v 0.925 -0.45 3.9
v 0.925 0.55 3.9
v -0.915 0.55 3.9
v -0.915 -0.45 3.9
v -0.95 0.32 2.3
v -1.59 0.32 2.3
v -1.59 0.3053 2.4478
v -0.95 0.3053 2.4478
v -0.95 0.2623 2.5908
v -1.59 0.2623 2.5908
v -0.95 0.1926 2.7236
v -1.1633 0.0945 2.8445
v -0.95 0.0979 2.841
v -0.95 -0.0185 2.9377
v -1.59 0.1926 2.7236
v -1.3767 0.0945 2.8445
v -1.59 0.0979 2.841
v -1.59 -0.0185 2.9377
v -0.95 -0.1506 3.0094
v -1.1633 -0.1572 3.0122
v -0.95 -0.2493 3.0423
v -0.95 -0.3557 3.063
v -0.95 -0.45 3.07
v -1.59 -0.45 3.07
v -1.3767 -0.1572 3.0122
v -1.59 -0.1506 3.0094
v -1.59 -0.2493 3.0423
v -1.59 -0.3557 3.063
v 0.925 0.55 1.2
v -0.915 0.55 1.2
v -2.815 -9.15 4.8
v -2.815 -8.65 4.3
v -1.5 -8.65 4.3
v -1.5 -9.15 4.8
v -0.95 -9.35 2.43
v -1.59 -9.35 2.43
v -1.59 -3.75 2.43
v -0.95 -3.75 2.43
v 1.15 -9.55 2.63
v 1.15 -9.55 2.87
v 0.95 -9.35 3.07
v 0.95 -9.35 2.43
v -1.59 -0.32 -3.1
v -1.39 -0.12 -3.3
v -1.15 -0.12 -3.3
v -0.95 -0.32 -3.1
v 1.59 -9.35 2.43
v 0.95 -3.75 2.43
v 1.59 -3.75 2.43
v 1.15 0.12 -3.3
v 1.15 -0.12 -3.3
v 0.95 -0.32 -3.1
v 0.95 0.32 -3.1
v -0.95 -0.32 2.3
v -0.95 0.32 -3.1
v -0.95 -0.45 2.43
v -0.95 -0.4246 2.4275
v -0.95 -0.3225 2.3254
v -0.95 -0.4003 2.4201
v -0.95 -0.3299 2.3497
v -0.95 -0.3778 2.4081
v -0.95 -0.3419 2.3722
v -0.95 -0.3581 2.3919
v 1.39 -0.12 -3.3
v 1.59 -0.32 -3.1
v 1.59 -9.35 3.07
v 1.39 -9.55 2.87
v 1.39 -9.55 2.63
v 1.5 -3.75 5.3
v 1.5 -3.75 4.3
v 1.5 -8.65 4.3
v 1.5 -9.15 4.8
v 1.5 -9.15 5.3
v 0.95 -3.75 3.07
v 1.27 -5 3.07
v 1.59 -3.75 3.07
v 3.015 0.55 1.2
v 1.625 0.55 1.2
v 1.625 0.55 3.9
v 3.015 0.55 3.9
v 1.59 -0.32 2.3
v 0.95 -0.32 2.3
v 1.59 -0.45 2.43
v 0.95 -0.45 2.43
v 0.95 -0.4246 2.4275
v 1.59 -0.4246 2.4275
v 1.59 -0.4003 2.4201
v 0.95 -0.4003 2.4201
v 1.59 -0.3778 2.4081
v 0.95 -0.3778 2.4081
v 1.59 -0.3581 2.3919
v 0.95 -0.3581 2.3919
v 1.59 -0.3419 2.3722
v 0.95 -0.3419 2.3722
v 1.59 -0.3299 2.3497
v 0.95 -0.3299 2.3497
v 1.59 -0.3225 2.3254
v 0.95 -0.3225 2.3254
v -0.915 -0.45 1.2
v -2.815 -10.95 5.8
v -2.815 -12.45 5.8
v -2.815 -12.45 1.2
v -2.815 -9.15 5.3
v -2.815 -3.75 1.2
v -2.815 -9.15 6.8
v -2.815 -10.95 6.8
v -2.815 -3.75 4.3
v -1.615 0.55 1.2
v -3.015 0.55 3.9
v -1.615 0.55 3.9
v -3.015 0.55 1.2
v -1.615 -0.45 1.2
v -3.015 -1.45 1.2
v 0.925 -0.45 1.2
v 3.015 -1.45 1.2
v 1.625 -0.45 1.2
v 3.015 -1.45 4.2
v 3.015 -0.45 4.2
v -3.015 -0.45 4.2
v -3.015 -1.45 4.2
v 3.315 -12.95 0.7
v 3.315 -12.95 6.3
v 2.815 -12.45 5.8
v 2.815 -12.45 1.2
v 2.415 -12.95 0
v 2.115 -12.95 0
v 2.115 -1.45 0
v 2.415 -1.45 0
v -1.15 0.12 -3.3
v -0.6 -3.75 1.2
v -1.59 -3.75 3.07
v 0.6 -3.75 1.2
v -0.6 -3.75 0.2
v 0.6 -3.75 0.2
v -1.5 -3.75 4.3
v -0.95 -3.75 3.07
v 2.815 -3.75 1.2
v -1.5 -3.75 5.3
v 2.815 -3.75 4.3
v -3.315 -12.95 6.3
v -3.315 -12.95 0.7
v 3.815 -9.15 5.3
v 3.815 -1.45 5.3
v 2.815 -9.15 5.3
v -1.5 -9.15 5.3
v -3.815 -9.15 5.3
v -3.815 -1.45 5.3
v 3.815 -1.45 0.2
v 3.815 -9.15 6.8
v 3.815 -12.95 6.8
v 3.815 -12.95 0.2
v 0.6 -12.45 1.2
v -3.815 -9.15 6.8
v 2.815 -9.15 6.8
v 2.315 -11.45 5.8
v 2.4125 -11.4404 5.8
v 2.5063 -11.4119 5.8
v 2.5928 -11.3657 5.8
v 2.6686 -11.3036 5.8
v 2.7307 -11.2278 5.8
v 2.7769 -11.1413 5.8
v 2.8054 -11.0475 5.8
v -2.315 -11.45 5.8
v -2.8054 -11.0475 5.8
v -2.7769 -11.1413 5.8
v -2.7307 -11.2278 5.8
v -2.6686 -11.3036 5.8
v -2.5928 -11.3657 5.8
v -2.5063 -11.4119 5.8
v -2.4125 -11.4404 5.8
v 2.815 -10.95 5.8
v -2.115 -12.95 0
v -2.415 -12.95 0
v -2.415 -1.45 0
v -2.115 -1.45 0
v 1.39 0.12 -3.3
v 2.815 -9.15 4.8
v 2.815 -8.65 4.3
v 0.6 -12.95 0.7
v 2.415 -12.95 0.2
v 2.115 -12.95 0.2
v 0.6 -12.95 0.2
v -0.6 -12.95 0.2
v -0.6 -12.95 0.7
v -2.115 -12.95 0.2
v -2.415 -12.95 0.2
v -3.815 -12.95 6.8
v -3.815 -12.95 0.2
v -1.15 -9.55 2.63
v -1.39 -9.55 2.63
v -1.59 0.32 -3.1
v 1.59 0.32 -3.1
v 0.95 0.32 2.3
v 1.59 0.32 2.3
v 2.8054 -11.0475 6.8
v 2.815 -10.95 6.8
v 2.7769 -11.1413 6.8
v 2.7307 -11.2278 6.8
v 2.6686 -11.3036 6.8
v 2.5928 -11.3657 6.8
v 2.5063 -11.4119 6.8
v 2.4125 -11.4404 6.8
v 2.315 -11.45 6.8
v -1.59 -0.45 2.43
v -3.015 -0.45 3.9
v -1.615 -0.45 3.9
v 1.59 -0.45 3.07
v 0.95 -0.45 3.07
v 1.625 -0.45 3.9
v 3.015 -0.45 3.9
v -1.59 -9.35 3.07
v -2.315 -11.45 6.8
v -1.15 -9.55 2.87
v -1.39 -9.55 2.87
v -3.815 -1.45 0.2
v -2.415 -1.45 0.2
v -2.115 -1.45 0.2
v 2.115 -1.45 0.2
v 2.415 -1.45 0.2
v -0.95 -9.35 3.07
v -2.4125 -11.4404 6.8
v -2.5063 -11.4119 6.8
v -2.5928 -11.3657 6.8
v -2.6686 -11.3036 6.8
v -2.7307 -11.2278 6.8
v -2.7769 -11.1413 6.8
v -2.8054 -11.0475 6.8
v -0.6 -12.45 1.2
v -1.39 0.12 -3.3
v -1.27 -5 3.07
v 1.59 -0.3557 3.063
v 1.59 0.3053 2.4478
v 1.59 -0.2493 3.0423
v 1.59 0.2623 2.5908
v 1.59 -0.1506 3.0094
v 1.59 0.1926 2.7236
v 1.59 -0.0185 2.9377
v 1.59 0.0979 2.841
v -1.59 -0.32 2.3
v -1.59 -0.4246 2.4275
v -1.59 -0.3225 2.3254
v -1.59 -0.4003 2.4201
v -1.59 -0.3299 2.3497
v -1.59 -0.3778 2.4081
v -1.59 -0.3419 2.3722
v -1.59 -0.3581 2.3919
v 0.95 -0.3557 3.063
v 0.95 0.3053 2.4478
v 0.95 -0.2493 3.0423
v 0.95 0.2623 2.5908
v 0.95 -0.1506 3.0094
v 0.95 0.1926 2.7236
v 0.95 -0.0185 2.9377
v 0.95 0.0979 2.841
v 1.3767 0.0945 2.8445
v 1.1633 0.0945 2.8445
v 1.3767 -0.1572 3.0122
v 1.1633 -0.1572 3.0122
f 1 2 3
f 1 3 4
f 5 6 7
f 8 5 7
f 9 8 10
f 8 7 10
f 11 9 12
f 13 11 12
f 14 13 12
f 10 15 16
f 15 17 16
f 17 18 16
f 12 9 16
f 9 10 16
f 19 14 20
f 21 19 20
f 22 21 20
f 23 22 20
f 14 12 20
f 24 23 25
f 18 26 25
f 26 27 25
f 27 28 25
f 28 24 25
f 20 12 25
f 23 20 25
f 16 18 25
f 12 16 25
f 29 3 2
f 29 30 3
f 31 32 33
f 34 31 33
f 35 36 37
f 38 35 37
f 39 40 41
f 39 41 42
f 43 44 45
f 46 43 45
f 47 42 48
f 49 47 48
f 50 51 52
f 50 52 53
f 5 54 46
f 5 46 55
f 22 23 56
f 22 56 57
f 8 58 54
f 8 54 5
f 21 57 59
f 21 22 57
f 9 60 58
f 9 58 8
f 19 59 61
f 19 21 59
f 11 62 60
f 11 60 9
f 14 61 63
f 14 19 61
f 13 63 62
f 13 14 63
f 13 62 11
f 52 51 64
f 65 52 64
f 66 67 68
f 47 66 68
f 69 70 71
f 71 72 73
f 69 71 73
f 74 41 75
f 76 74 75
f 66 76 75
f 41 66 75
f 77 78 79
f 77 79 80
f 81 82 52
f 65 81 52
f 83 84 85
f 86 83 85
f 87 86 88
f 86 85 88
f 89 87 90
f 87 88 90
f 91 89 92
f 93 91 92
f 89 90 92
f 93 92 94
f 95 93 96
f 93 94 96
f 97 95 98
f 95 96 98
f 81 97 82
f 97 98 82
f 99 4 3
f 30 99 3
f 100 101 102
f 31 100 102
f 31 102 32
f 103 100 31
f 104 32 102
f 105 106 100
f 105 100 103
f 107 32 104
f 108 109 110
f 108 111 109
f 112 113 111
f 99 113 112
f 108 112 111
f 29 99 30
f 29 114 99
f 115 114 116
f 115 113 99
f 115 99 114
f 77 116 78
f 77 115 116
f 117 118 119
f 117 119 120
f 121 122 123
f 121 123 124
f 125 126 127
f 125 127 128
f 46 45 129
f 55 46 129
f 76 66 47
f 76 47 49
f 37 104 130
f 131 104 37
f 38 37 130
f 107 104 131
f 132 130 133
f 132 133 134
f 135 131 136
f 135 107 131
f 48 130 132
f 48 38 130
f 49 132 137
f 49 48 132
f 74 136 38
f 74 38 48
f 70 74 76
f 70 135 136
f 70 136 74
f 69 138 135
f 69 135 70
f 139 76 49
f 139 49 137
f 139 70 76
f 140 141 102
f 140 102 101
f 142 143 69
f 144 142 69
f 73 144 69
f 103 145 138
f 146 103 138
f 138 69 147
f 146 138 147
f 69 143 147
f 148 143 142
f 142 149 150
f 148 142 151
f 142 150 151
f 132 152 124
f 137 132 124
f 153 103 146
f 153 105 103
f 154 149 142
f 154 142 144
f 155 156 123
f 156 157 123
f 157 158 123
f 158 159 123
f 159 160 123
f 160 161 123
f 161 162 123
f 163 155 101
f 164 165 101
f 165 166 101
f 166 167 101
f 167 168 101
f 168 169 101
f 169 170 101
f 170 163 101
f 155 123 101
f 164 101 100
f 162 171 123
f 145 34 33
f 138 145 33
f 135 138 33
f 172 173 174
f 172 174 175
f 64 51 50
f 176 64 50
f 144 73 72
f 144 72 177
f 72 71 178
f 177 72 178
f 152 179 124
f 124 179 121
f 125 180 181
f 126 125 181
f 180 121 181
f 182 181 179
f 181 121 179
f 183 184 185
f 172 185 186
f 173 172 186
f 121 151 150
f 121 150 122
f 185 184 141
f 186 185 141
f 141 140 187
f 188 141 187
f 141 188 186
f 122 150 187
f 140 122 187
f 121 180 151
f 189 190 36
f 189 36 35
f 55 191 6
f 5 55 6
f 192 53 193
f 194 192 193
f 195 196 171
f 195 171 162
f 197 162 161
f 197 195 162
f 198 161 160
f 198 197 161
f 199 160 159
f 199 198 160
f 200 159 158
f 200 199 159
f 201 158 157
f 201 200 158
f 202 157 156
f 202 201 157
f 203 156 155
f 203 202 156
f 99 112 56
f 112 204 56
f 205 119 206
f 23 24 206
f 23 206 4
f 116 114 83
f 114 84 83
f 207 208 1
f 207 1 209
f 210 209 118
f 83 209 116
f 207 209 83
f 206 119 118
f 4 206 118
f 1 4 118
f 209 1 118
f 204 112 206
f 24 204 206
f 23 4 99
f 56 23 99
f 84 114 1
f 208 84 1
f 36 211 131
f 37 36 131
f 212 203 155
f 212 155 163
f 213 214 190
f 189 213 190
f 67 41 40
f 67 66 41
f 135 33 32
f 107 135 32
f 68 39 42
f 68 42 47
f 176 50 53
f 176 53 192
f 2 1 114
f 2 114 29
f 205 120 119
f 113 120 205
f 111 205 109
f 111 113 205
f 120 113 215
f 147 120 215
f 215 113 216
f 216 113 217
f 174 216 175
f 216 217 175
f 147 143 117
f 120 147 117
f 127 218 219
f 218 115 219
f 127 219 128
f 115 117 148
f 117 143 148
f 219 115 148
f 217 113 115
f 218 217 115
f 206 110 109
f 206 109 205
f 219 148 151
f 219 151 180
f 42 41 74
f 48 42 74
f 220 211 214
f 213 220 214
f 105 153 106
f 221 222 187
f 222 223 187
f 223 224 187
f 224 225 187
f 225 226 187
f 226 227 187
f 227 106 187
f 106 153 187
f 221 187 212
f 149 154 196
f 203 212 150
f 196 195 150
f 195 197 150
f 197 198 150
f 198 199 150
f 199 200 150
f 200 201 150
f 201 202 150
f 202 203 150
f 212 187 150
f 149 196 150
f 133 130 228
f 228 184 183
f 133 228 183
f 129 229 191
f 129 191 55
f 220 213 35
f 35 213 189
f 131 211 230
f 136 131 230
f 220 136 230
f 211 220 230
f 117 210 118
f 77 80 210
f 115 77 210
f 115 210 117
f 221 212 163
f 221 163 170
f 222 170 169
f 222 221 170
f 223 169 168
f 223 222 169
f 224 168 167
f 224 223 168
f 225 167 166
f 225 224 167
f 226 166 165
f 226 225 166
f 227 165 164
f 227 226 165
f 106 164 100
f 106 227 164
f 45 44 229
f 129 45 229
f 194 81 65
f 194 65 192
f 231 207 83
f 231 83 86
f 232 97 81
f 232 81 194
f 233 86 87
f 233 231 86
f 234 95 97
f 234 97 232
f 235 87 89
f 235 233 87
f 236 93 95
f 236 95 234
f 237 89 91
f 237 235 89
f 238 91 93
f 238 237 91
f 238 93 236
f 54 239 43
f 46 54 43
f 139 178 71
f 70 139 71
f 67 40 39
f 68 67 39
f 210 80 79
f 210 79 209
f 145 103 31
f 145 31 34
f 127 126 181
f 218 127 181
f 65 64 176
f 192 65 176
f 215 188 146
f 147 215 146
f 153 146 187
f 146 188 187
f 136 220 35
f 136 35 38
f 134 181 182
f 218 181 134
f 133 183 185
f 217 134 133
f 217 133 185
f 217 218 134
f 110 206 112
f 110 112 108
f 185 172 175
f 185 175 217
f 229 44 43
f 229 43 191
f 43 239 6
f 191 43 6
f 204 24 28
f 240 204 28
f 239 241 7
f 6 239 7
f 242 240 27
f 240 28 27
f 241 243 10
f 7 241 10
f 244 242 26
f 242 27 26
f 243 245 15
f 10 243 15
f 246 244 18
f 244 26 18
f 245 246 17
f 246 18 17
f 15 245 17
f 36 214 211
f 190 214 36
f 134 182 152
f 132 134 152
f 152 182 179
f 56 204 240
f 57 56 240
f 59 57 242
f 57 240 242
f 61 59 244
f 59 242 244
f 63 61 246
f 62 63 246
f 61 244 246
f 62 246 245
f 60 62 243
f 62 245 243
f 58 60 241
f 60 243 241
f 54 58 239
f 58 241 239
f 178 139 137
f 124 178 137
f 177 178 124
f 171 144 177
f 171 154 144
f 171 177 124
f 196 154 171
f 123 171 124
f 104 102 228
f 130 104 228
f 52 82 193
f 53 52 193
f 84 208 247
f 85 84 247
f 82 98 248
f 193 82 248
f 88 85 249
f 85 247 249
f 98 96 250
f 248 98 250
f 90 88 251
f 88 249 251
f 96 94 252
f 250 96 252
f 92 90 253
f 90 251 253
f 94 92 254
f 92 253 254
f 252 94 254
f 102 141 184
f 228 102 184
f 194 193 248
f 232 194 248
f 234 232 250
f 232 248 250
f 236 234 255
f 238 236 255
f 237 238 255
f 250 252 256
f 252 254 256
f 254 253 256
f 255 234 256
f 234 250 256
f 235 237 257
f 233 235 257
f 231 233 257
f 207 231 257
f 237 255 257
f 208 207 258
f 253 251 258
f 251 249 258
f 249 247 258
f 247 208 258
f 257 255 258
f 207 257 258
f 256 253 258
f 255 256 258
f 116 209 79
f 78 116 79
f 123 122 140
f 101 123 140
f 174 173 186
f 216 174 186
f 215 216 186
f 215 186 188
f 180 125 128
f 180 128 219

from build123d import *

# Parameters (mm, degrees)
EXTRUDE_START                      = 0.2
EXTRUDE_1_DEPTH                    = 5.1
SKETCH_7_W                         = 0.3
SKETCH_7_H                         = 0.2
EXTRUDE_4_DEPTH                    = 11.5
SKETCH_8_W                         = 1
SKETCH_8_H                         = 2
CUT_EXTRUDE_5_DEPTH                = 6.03
CUT_EXTRUDE_1_DEPTH                = 9.2
EXTRUDE_2_DEPTH                    = 3.8
SKETCH_4_W                         = 5.63
SKETCH_4_H                         = 1
CUT_EXTRUDE_2_DEPTH                = 3.8
CUT_EXTRUDE_3_REACH                = 17.116
CHAMFER_1_SIZE                     = 0.5
CUT_EXTRUDE_6_REACH                = 16.052
SKETCH_9_W                         = 0.7
SKETCH_9_H                         = 1
SWEEP_START                        = 0.95
SWEEP_1_DEPTH                      = 0.64
CHAMFER_2_SIZE                     = 0.2
PATTERN_LINEAR_2_COUNT             = 2
PATTERN_LINEAR_2_PITCH             = 2.54
PATTERN_LINEAR_1_COUNT             = 2
PATTERN_LINEAR_1_PITCH             = 2.54
CHAMFER_2_OF_PATTERN_LINEAR_1_SIZE = 0.2


# Read off the part's stored shape, not the designer's step: По траектории1
with BuildPart() as part:
    # Эскиз1 → Бобышка-Вытянуть1 (new body)
    with BuildSketch(Plane.XY.offset(EXTRUDE_START)):
        Polygon((-3.015, 0.55), (3.015, 0.55), (3.015, -1.45), (3.815, -1.45), (3.815, -12.95), (-3.815, -12.95), (-3.815, -1.45), (-3.015, -1.45), align=None)
    extrude(amount=EXTRUDE_1_DEPTH)

    # Эскиз7 → Бобышка-Вытянуть4 (add)
    with BuildSketch(Plane.XZ.offset(12.95)):
        with Locations((2.265, 0.1)):
            Rectangle(SKETCH_7_W, SKETCH_7_H)
        with Locations((-2.265, 0.1)):
            Rectangle(SKETCH_7_W, SKETCH_7_H)
    extrude(amount=-EXTRUDE_4_DEPTH)

    # Эскиз8 → Вырез-Вытянуть5 (cut)
    with BuildSketch(Plane(origin=(3.015, 0, 0), x_dir=(0, 0, -1), z_dir=(1, 0, 0))):
        with Locations((-0.7, -0.45)):
            Rectangle(SKETCH_8_W, SKETCH_8_H)
        Polygon((-4.2, -1.45), (-5.3, -1.45), (-5.3, 0.55), (-3.9, 0.55), (-3.9, -0.45), (-4.2, -0.45), align=None)
    extrude(amount=-CUT_EXTRUDE_5_DEPTH, mode=Mode.SUBTRACT)

    # Эскиз2 → Вырез-Вытянуть1 (cut)
    with BuildSketch(Plane.XZ.offset(12.95)):
        Polygon((-2.815, 4.3), (-2.815, 1.2), (-0.6, 1.2), (-0.6, 0.2), (0.6, 0.2), (0.6, 1.2), (2.815, 1.2), (2.815, 4.3), (1.5, 4.3), (1.5, 5.3), (-1.5, 5.3), (-1.5, 4.3), align=None)
    extrude(amount=-CUT_EXTRUDE_1_DEPTH, mode=Mode.SUBTRACT)

    # Эскиз3 → Бобышка-Вытянуть2 (add)
    with BuildSketch(Plane.XZ.offset(12.95)):
        Polygon((-3.815, 5.3), (-3.815, 6.8), (3.815, 6.8), (3.815, 5.3), (2.815, 5.3), (2.815, 5.8), (-2.815, 5.8), (-2.815, 5.3), align=None)
    extrude(amount=-EXTRUDE_2_DEPTH)

    # Эскиз4 → Вырез-Вытянуть2 (cut)
    with BuildSketch(Plane.XZ.offset(12.95)):
        with Locations((0, 4.8)):
            Rectangle(SKETCH_4_W, SKETCH_4_H)
    extrude(amount=-CUT_EXTRUDE_2_DEPTH, mode=Mode.SUBTRACT)

    # Эскиз5 → Вырез-Вытянуть3 (cut, up to next)
    with BuildSketch(Plane.XY.offset(6.8), mode=Mode.PRIVATE) as cut_extrude_3_sk1:
        with BuildLine():
            Line((2.815, -9.15), (2.815, -10.95))
            ThreePointArc((2.815, -10.95), (2.668553391, -11.303553391), (2.315, -11.45))
            Line((2.315, -11.45), (-2.315, -11.45))
            ThreePointArc((-2.315, -11.45), (-2.668553391, -11.303553391), (-2.815, -10.95))
            Line((-2.815, -10.95), (-2.815, -9.15))
            Line((-2.815, -9.15), (2.815, -9.15))
        make_face()
    cut_extrude_3_tool1 = extrude(cut_extrude_3_sk1.sketch, amount=-CUT_EXTRUDE_3_REACH, mode=Mode.PRIVATE) & part.part
    add(cut_extrude_3_tool1.solids().sort_by_distance((0, -10.291324, 6.8))[0], mode=Mode.SUBTRACT)

    # Фаска1
    chamfer_1_edges = [part.edges().sort_by_distance(p)[0] for p in [
        (0, -12.95, 5.8),
        (-2.1575, -9.15, 4.3),
        (2.1575, -9.15, 4.3),
        (-2.815, -12.95, 3.5),
        (-1.7075, -12.95, 1.2),
        (1.7075, -12.95, 1.2),
        (2.815, -12.95, 3.5),
    ]]
    chamfer(chamfer_1_edges, length=CHAMFER_1_SIZE)

    # Эскиз9 → Вырез-Вытянуть6 (cut, up to next)
    with BuildSketch(Plane.XY.offset(3.9), mode=Mode.PRIVATE) as cut_extrude_6_sk1:
        with Locations((1.275, 0.05)):
            Rectangle(SKETCH_9_W, SKETCH_9_H)
    cut_extrude_6_tool1 = extrude(cut_extrude_6_sk1.sketch, amount=-CUT_EXTRUDE_6_REACH, mode=Mode.PRIVATE) & part.part
    cut_extrude_6 = cut_extrude_6_tool1.solids().sort_by_distance((1.275, 0.05, 3.9))[0]
    add(cut_extrude_6, mode=Mode.SUBTRACT)

    # По траектории1 outline → По траектории1 (add)
    with BuildSketch(Plane.YZ.offset(SWEEP_START)):
        with BuildLine():
            Line((-3.75, 2.43), (-3.75, 3.07))
            add(Edge.make_bspline(
                [(-3.75, 3.07), (-4.166666667, 3.07), (-4.583333333, 3.07), (-6.516666667, 3.07), (-8.033333333, 3.07), (-9.55, 3.07)],
                knots=[0.623544277, 0.623544277, 0.623544277, 0.623544277, 0.704676976, 0.704676976, 1, 1, 1, 1], degree=3))
            Line((-9.55, 3.07), (-9.55, 2.43))
            Line((-9.55, 2.43), (-3.75, 2.43))
        make_face()
        with BuildLine():
            Line((0.32, -3.3), (0.32, 2.3))
            add(Edge.make_bspline(
                [(0.32, 2.3), (0.32, 2.499654349), (0.23877091, 2.700173533), (0.022322877, 2.916621566), (-0.064240468, 2.973940923), (-0.250203983, 3.050392149), (-0.370157621, 3.069944018), (-0.45, 3.07)],
                knots=[0.363474491, 0.363474491, 0.363474491, 0.363474491, 0.386414221, 0.386414221, 0.397884087, 0.397884087, 0.409353952, 0.409353952, 0.409353952, 0.409353952], degree=3))
            Line((-0.45, 3.07), (-0.45, 2.43))
            ThreePointArc((-0.45, 2.43), (-0.358076118, 2.391923882), (-0.32, 2.3))
            Line((-0.32, 2.3), (-0.32, -3.3))
            Line((-0.32, -3.3), (0.32, -3.3))
        make_face()
    sweep_1 = extrude(amount=SWEEP_1_DEPTH)

    # Фаска2
    chamfer_2_edges = [part.edges().sort_by_distance(p)[0] for p in [
        (1.27, -9.55, 3.07),
        (1.59, -9.55, 2.75),
        (1.27, -9.55, 2.43),
        (0.95, -9.55, 2.75),
        (1.27, -0.32, -3.3),
        (1.59, 0, -3.3),
        (1.27, 0.32, -3.3),
        (0.95, 0, -3.3),
    ]]
    chamfer(chamfer_2_edges, length=CHAMFER_2_SIZE)

    # Линейный массив2: Вырез-Вытянуть6 ×2
    with Locations(*[(-i * PATTERN_LINEAR_2_PITCH, 0, 0) for i in range(1, PATTERN_LINEAR_2_COUNT)]):
        add(cut_extrude_6, mode=Mode.SUBTRACT)

    # Линейный массив1: По траектории1 ×2
    with Locations(*[(-i * PATTERN_LINEAR_1_PITCH, 0, 0) for i in range(1, PATTERN_LINEAR_1_COUNT)]):
        add(sweep_1)

    # Фаска2 of Линейный массив1
    chamfer_2_of_pattern_linear_1_edges = [part.edges().sort_by_distance(p)[0] for p in [
        (-1.27, -9.55, 3.07),
        (-0.95, -9.55, 2.75),
        (-1.27, -9.55, 2.43),
        (-1.59, -9.55, 2.75),
        (-1.27, -0.32, -3.3),
        (-0.95, 0, -3.3),
        (-1.27, 0.32, -3.3),
        (-1.59, 0, -3.3),
    ]]
    chamfer(chamfer_2_of_pattern_linear_1_edges, length=CHAMFER_2_OF_PATTERN_LINEAR_1_SIZE)


solid = part.part
